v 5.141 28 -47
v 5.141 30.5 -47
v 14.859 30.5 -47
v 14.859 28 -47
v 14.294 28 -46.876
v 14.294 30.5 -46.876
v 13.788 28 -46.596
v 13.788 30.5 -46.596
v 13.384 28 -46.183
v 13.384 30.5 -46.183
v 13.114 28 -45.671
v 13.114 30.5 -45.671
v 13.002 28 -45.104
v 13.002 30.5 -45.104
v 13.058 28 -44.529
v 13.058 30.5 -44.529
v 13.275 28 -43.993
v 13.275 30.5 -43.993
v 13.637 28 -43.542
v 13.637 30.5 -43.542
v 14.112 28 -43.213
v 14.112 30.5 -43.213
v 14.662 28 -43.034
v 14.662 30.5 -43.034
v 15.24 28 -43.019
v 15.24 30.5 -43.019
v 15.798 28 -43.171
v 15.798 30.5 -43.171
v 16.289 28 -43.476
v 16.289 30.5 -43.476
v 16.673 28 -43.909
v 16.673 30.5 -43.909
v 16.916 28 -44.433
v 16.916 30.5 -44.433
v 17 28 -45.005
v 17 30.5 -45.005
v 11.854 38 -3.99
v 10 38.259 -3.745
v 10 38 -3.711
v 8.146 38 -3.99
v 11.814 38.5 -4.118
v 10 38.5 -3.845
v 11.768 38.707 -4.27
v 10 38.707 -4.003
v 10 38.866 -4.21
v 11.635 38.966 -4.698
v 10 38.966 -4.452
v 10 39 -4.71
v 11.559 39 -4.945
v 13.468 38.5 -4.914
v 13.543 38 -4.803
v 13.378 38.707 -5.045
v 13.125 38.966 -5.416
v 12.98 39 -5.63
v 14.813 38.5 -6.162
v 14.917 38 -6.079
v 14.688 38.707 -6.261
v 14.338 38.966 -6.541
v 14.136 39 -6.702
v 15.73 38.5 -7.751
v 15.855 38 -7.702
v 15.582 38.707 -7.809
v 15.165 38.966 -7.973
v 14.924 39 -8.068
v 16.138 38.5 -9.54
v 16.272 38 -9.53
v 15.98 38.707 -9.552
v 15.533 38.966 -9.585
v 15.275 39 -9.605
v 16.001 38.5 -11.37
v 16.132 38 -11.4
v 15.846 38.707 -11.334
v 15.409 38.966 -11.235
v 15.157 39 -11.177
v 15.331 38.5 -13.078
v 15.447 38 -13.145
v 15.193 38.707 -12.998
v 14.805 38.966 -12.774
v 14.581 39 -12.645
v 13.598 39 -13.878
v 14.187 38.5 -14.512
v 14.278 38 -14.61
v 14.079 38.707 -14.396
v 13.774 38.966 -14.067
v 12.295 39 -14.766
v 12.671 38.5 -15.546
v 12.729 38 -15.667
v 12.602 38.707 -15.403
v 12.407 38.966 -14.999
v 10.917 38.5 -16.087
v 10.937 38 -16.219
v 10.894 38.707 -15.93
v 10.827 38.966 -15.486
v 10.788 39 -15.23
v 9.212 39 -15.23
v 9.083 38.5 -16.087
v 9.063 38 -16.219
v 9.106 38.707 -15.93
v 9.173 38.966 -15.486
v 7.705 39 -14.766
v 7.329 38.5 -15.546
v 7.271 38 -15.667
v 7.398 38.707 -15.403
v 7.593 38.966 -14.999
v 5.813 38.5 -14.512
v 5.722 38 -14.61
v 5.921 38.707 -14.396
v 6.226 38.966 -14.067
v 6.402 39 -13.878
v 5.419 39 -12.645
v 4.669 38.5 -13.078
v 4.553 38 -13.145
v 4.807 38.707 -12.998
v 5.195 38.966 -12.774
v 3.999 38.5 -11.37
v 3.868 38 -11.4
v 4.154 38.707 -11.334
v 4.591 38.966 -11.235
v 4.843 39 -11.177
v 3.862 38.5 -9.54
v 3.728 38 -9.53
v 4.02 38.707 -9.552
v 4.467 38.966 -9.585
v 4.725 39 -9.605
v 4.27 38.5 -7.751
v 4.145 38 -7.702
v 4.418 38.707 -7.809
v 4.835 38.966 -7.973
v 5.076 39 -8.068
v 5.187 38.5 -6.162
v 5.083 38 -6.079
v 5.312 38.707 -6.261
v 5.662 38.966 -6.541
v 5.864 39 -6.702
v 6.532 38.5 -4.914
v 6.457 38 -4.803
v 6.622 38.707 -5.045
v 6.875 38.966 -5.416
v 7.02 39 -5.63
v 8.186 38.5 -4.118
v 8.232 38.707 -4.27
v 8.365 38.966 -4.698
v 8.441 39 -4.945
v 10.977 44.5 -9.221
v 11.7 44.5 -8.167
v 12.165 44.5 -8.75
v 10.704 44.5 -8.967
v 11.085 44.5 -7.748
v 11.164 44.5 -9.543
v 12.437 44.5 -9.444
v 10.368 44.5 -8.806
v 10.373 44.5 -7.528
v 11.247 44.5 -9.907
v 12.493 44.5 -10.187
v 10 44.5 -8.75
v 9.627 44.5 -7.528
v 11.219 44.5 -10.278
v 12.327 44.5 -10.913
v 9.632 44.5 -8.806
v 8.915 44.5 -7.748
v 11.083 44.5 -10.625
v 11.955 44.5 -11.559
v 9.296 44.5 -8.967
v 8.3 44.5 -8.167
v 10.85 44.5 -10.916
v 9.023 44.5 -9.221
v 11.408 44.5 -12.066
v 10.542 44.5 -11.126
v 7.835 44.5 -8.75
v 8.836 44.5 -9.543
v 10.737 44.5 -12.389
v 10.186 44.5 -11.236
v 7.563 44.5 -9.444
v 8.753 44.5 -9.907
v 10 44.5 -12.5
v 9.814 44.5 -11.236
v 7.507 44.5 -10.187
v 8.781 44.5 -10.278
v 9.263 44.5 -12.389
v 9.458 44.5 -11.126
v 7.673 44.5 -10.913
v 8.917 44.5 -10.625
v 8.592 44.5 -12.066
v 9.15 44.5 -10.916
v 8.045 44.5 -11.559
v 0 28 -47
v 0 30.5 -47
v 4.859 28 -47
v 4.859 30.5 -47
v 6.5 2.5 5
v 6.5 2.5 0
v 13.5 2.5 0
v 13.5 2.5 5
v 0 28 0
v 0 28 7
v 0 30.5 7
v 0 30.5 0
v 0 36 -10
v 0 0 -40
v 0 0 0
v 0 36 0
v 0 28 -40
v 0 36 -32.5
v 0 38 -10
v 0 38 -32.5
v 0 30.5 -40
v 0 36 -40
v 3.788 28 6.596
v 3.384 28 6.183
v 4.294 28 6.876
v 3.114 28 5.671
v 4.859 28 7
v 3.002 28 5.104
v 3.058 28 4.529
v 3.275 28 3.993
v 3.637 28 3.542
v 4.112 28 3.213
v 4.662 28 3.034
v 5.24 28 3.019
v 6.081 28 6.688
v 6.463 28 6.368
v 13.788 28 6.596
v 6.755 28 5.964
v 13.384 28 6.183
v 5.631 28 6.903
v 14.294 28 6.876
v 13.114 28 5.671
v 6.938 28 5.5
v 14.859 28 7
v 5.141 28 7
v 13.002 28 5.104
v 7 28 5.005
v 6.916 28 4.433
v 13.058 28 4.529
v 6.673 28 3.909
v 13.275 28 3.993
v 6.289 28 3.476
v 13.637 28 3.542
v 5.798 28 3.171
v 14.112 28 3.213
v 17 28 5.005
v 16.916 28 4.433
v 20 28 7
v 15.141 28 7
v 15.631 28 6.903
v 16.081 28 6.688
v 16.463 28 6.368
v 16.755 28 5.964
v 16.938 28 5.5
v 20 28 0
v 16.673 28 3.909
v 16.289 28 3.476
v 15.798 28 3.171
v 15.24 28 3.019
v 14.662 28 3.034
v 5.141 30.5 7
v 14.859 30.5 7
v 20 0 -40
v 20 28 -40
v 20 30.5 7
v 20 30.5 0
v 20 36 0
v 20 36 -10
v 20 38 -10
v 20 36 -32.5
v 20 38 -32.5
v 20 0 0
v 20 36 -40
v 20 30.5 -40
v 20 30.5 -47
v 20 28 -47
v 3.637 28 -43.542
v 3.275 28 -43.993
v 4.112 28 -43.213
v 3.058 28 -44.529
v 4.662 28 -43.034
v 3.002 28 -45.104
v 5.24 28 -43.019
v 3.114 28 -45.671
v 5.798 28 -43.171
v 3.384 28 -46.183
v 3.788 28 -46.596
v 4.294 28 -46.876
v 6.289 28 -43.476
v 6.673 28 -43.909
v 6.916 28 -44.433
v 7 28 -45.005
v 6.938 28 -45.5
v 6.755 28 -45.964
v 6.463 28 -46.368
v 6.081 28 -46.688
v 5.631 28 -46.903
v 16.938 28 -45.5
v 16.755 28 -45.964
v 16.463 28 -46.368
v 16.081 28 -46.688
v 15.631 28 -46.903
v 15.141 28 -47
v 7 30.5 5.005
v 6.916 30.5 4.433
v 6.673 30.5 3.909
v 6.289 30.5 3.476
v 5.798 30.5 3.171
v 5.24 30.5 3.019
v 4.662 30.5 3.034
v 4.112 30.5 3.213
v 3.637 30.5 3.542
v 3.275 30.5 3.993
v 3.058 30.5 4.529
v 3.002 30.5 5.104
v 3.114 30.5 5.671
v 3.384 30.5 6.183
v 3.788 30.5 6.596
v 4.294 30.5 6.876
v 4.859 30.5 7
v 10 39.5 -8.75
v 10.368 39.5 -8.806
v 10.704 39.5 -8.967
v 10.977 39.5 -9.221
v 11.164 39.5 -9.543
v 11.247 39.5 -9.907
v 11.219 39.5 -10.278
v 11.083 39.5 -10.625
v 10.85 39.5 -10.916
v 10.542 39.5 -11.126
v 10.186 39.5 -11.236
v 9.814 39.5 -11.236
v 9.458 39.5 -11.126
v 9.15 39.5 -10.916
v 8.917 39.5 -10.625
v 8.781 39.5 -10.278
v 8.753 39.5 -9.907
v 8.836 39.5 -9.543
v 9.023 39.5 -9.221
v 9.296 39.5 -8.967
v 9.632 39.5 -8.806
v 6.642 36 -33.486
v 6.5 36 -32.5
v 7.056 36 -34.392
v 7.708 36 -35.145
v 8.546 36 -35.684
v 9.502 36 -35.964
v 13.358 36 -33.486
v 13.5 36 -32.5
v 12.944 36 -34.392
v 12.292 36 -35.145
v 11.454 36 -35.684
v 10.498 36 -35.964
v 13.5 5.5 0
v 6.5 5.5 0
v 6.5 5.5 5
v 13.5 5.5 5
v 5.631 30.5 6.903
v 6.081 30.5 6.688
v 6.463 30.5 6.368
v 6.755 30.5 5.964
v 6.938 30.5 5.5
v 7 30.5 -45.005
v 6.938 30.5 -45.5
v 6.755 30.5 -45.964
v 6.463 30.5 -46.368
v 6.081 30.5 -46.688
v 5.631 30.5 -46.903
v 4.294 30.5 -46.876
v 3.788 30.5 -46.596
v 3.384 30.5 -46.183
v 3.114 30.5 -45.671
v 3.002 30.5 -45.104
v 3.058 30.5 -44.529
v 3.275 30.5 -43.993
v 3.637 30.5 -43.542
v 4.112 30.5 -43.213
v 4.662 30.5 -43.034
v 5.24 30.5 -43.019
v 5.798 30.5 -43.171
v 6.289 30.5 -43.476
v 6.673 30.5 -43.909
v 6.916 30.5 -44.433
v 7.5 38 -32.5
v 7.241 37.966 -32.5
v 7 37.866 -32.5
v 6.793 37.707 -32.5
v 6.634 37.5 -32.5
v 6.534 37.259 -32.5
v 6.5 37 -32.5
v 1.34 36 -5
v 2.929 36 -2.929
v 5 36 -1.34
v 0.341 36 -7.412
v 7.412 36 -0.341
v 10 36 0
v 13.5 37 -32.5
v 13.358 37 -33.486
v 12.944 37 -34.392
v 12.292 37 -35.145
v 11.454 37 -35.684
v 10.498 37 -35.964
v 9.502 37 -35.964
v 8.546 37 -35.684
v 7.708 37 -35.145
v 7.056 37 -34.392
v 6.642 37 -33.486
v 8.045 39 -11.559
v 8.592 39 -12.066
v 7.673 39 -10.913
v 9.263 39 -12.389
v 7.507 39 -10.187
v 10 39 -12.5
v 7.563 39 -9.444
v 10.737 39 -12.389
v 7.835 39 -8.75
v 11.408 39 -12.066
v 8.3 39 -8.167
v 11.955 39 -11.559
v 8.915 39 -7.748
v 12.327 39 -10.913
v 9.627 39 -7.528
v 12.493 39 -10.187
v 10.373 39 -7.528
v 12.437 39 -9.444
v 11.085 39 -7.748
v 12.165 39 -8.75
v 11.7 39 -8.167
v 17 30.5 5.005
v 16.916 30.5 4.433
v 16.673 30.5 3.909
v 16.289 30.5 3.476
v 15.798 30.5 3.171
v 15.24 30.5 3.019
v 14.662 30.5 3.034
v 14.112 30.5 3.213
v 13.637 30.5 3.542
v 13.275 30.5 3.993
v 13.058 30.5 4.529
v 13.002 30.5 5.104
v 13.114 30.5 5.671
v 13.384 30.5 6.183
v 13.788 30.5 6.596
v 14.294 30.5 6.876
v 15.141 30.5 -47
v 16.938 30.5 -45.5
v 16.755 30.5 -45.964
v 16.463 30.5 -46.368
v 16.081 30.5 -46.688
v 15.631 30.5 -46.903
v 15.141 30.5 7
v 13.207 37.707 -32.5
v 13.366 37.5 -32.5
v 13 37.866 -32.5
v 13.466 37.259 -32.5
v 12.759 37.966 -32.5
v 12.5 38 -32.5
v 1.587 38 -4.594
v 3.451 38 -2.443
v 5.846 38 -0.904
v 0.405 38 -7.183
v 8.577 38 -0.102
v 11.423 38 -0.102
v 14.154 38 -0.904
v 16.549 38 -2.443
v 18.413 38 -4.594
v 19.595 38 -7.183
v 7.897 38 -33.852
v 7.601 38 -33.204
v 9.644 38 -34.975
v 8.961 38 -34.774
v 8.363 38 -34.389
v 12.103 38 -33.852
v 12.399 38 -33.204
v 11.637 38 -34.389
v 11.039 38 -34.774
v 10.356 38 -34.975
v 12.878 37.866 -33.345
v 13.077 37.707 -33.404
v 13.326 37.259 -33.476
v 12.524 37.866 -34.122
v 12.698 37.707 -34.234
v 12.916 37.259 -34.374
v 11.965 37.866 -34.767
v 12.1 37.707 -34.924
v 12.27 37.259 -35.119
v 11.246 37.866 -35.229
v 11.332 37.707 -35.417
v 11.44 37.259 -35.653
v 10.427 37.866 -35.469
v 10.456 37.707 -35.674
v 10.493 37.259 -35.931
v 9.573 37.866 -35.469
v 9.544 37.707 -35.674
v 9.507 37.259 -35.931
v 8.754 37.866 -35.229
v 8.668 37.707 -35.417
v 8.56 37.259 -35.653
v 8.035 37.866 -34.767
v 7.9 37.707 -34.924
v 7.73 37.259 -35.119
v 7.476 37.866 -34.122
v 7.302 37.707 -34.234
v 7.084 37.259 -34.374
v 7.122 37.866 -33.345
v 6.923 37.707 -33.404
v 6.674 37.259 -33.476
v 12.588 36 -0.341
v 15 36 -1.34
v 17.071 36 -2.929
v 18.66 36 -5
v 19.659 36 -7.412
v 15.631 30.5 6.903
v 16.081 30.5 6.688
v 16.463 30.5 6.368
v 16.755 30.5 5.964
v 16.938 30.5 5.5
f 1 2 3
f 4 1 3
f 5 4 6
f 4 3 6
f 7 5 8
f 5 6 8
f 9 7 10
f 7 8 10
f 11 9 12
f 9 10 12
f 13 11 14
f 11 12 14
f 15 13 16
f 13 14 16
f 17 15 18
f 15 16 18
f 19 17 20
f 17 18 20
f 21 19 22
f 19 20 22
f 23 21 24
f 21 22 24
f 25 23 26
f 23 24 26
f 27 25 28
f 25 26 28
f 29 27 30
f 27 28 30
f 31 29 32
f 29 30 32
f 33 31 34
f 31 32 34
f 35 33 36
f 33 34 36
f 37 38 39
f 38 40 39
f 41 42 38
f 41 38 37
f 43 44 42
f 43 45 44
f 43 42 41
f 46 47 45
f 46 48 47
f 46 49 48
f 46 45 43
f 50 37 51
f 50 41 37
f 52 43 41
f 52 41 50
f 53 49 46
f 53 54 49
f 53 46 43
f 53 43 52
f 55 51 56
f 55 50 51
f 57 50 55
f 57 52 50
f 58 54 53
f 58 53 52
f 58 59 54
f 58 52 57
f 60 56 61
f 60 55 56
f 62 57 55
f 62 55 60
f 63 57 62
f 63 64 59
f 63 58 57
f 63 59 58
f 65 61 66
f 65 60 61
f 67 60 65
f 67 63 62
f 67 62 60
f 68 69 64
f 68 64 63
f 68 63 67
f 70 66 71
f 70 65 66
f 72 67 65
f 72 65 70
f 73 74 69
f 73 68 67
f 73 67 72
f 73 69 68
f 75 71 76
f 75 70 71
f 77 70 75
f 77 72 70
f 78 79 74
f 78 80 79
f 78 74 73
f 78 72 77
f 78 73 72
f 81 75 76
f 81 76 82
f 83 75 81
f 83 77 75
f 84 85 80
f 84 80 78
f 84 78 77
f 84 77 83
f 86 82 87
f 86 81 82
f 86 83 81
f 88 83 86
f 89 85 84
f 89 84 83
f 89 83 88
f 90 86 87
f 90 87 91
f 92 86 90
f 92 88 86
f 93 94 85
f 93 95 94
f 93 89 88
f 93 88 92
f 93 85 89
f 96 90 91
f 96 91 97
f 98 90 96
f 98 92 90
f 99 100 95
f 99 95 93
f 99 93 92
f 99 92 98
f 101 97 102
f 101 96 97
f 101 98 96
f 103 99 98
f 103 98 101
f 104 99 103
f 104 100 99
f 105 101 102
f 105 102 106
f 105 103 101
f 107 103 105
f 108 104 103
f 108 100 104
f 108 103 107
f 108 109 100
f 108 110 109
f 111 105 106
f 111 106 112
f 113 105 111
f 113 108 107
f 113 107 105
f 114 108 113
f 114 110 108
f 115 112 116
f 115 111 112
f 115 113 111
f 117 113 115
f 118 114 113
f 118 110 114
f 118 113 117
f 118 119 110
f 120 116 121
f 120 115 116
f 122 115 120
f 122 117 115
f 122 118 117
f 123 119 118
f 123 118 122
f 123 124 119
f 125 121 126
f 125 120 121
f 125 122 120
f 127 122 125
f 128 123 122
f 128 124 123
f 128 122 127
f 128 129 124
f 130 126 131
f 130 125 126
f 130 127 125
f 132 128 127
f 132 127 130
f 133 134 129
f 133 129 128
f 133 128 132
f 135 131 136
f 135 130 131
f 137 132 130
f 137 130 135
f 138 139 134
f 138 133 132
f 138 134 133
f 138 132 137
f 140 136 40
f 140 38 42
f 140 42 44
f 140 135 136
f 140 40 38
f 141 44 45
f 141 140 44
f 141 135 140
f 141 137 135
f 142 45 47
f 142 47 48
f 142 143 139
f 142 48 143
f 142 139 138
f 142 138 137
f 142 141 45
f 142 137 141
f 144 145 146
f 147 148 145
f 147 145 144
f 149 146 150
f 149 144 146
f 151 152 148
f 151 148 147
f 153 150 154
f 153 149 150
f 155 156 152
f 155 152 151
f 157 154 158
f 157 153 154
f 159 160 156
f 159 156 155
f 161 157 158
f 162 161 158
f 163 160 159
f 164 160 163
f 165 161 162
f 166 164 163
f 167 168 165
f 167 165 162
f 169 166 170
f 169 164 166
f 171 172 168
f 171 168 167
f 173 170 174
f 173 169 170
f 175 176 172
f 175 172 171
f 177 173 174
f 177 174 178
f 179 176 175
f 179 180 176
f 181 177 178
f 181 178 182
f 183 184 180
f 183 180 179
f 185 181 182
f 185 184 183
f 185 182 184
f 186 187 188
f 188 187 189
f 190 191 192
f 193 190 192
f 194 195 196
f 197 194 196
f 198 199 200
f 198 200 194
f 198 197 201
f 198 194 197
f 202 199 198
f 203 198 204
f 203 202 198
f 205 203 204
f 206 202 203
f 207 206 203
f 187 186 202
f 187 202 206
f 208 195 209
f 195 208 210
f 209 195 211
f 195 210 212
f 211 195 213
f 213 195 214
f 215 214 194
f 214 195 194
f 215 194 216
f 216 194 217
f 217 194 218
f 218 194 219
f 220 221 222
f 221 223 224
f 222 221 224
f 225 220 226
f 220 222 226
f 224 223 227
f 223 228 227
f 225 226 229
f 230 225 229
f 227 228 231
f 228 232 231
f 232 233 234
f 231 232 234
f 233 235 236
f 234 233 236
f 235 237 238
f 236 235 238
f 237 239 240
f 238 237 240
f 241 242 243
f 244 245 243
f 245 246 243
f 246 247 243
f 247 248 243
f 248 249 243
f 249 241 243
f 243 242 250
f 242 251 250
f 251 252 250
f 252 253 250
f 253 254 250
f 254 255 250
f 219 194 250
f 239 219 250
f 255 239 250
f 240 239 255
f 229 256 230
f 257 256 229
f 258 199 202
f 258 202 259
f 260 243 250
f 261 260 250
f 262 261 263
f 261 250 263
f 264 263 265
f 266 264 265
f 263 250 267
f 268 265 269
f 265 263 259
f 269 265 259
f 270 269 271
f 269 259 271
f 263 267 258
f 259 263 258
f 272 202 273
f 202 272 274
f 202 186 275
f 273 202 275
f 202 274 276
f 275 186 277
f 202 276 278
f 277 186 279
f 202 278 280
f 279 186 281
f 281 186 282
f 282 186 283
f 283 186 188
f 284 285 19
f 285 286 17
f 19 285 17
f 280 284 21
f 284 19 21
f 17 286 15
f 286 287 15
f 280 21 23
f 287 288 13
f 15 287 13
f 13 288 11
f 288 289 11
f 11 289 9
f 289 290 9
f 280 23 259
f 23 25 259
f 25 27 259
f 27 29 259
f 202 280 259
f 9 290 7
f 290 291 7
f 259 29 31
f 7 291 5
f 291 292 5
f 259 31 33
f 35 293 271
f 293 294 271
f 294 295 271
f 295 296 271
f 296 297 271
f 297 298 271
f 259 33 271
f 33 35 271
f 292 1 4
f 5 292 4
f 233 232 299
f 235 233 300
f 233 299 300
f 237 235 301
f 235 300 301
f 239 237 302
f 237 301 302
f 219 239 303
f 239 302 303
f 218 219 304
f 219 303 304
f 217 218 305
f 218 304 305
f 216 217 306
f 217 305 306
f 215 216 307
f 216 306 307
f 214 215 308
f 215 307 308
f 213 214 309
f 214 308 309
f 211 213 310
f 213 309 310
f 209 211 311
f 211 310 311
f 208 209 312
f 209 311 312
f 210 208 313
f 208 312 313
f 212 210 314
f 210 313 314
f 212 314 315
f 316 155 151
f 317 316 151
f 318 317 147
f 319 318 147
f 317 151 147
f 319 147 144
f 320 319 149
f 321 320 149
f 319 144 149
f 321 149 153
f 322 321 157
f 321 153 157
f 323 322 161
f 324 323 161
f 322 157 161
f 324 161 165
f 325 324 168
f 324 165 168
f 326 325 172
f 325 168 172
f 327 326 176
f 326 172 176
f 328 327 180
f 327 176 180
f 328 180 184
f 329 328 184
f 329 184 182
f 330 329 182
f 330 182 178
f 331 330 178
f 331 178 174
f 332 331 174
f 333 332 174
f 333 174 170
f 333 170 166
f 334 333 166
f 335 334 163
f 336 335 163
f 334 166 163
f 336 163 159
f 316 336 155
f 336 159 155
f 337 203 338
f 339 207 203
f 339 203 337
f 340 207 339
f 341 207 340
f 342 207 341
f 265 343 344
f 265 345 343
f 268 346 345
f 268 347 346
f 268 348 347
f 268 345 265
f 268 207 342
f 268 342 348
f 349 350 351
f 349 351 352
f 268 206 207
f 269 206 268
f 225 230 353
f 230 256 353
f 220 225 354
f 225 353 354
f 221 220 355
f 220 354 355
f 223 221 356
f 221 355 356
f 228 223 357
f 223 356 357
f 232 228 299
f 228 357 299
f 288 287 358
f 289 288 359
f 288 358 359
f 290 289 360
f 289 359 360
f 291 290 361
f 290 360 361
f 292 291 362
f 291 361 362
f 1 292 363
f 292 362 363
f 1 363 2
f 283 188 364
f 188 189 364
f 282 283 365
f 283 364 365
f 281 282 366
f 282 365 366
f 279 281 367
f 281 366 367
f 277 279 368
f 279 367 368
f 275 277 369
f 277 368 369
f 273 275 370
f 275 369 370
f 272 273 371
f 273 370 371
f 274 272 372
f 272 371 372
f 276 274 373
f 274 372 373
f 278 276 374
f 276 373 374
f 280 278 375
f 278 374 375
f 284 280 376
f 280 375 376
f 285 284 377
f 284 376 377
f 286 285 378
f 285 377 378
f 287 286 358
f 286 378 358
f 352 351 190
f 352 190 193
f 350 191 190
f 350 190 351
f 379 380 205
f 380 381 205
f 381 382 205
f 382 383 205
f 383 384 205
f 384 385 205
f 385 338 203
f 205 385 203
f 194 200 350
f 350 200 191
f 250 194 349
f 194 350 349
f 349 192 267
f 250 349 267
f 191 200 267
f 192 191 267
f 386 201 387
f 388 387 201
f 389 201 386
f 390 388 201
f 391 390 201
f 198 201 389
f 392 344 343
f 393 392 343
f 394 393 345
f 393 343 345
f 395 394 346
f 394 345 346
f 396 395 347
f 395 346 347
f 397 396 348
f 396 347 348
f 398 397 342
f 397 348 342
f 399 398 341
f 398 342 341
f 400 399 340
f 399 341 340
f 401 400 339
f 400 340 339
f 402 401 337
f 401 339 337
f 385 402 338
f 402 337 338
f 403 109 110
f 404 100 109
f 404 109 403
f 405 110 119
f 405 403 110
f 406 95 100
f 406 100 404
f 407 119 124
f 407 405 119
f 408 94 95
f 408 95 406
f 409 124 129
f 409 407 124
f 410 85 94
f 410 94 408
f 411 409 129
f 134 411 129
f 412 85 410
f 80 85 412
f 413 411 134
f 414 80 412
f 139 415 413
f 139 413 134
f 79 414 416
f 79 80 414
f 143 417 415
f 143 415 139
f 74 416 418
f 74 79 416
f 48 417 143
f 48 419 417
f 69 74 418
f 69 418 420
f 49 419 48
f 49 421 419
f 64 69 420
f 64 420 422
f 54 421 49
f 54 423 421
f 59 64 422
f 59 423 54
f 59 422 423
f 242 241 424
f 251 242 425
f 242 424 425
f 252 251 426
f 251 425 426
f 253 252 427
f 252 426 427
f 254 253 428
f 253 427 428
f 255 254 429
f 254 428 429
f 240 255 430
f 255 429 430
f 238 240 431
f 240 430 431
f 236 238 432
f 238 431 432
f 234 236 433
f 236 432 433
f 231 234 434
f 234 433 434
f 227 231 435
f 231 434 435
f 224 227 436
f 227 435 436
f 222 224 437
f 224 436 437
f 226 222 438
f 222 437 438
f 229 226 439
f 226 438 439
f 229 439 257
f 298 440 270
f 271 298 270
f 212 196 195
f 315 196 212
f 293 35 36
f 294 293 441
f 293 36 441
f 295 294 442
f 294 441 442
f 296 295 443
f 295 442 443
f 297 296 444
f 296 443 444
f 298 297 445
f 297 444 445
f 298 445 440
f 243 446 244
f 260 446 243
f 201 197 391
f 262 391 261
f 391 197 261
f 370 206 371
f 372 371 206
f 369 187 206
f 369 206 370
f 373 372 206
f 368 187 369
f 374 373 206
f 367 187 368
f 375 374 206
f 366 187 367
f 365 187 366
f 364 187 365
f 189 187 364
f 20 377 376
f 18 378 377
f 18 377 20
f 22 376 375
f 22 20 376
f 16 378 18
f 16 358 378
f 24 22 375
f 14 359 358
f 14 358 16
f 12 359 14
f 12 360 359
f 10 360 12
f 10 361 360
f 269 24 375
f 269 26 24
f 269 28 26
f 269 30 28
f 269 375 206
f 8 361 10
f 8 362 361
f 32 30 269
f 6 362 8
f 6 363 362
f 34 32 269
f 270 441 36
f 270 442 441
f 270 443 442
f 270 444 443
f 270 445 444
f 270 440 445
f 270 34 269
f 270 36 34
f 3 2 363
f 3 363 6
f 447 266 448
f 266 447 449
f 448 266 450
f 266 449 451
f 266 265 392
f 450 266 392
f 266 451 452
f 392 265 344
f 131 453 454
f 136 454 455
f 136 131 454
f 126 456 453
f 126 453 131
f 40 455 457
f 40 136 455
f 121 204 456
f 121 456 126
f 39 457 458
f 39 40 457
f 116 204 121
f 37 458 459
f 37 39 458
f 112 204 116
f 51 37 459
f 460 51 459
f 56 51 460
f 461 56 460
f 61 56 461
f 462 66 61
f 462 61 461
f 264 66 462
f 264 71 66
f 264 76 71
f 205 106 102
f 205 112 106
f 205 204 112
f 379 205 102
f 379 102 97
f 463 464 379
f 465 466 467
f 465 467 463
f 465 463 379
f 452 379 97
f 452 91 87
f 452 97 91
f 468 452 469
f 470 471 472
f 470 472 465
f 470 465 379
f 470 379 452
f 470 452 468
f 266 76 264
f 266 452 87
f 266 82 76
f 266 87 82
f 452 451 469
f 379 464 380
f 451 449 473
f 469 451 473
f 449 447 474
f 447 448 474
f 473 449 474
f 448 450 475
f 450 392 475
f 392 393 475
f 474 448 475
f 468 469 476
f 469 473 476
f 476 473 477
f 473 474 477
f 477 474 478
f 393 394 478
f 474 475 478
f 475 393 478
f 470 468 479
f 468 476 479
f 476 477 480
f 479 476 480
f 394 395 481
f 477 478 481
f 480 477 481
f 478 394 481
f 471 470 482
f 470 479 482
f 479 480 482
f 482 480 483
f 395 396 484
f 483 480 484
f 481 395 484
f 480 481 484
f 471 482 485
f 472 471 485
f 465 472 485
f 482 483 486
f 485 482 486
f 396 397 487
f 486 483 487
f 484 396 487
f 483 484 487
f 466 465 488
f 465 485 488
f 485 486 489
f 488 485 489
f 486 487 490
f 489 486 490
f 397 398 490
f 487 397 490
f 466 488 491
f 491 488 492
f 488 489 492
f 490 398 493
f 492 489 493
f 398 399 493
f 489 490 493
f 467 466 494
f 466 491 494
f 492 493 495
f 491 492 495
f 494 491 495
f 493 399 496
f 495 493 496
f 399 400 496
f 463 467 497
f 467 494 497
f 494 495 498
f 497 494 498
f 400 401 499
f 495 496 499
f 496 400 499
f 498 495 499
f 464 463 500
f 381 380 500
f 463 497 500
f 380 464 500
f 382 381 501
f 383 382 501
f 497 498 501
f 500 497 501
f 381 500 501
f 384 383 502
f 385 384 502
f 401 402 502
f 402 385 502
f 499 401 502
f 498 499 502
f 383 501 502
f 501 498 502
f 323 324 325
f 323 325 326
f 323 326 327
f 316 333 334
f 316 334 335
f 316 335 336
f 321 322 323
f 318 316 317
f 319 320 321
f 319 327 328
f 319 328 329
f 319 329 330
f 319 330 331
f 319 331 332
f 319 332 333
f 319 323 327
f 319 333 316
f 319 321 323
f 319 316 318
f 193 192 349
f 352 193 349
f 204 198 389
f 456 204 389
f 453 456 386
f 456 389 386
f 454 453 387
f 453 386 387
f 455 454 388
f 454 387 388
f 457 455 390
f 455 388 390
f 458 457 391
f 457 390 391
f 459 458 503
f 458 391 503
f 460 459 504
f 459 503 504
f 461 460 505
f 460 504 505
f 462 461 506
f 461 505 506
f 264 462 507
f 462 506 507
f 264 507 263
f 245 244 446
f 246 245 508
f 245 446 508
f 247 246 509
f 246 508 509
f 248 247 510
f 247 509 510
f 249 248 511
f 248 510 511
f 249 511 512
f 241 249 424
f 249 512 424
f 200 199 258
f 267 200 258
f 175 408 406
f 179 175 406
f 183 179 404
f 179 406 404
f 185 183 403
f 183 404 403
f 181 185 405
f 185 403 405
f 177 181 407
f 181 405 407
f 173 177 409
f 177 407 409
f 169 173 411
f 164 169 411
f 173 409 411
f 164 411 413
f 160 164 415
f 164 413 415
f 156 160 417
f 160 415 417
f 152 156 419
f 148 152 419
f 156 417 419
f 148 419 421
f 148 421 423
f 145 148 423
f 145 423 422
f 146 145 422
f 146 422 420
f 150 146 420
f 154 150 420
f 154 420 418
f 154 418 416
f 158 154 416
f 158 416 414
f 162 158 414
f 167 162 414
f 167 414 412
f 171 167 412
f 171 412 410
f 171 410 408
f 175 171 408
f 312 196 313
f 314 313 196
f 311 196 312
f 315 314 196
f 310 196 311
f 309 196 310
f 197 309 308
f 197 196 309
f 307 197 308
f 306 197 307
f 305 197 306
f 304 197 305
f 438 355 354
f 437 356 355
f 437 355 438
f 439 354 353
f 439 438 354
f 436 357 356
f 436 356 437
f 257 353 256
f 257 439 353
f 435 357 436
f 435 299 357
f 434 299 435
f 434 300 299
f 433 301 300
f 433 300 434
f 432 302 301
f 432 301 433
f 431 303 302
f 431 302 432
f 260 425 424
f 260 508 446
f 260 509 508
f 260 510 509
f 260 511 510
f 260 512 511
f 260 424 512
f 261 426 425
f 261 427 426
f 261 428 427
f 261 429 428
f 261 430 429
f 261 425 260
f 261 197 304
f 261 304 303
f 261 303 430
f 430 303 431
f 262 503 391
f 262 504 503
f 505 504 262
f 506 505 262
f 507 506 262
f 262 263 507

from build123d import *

# Parameters (mm, degrees)
SKETCH1_W                = 20
SKETCH1_H                = 40
BOSS_EXTRUDE1_DEPTH      = 36
SKETCH2_W                = 7
SKETCH2_H                = 3
BOSS_EXTRUDE2_DEPTH      = 5
SKETCH3_R                = 2.5
BOSS_EXTRUDE3_DEPTH      = 8.5
BOSS_EXTRUDE4_DEPTH      = 7
BOSS_EXTRUDE4_DEPTH_BACK = 47
SKETCH4_W                = 20
SKETCH4_H                = 2.5
SKETCH5_R                = 2
CUT_EXTRUDE1_DEPTH       = 7
BOSS_EXTRUDE5_DEPTH      = 2
SKETCH7_R                = 6.289454611
BOSS_EXTRUDE6_DEPTH      = 1
FILLET1_R                = 1
FILLET2_R                = 1
SKETCH8_R                = 1.25
CUT_EXTRUDE2_DEPTH       = 5


with BuildPart() as part:
    # Sketch1 → Boss-Extrude1 (new body)
    with BuildSketch(Plane(origin=(0, 0, 0), x_dir=(1, 0, 0), z_dir=(0, 1, 0))):
        with Locations((10, 20)):
            Rectangle(SKETCH1_W, SKETCH1_H)
    extrude(amount=BOSS_EXTRUDE1_DEPTH)

    # Sketch2 → Boss-Extrude2 (add)
    with BuildSketch(Plane.XY):
        with Locations((10, 4)):
            Rectangle(SKETCH2_W, SKETCH2_H)
    extrude(amount=BOSS_EXTRUDE2_DEPTH)

    # Sketch3 → Boss-Extrude3 (add)
    with BuildSketch(Plane(origin=(0, 36, 0), x_dir=(1, 0, 0), z_dir=(0, 1, 0))):
        with Locations(Location((10, 10, 0), (0, 0, 90))):
            Circle(SKETCH3_R)
    extrude(amount=BOSS_EXTRUDE3_DEPTH)

    # Sketch4 → Boss-Extrude4 (add, two sides: drawn at the far end of the back side and taken through both)
    with BuildSketch(Plane.XY.offset(-BOSS_EXTRUDE4_DEPTH_BACK)):
        with Locations((10, 29.25)):
            Rectangle(SKETCH4_W, SKETCH4_H)
    extrude(amount=BOSS_EXTRUDE4_DEPTH + BOSS_EXTRUDE4_DEPTH_BACK)

    # Sketch5 → Cut-Extrude1 (cut)
    with BuildSketch(Plane(origin=(0, 30.5, 0), x_dir=(1, 0, 0), z_dir=(0, 1, 0))):
        with Locations((15, 45.005)):
            Circle(SKETCH5_R)
        with Locations((5, 45.005)):
            Circle(SKETCH5_R)
        with Locations((15, -5.005)):
            Circle(SKETCH5_R)
        with Locations((5, -5.005)):
            Circle(SKETCH5_R)
    extrude(amount=-CUT_EXTRUDE1_DEPTH, mode=Mode.SUBTRACT)

    # Sketch6 → Boss-Extrude5 (add)
    with BuildSketch(Plane(origin=(0, 36, 0), x_dir=(1, 0, 0), z_dir=(0, 1, 0))):
        with BuildLine():
            Line((20, 32.5), (13.5, 32.5))
            ThreePointArc((13.5, 32.5), (10, 36), (6.5, 32.5))
            Line((6.5, 32.5), (0, 32.5))
            Line((0, 32.5), (0, 10))
            ThreePointArc((0, 10), (10, 0), (20, 10))
            Line((20, 10), (20, 32.5))
        make_face()
    extrude(amount=BOSS_EXTRUDE5_DEPTH)

    # Sketch7 → Boss-Extrude6 (add)
    with BuildSketch(Plane(origin=(0, 38, 0), x_dir=(1, 0, 0), z_dir=(0, 1, 0))):
        with Locations(Location((10, 10, 0), (0, 0, 270))):
            Circle(SKETCH7_R)
    extrude(amount=BOSS_EXTRUDE6_DEPTH)

    # Fillet1
    fillet1_edges = [part.edges().sort_by_distance(p)[0] for p in [
        (10, 39, -16.289454611),
    ]]
    fillet(fillet1_edges, radius=FILLET1_R - 0.0001)  # a hair under: the kernel refuses the full size

    # Fillet2
    fillet2_edges = [part.edges().sort_by_distance(p)[0] for p in [
        (10, 38, -36),
    ]]
    fillet(fillet2_edges, radius=FILLET2_R)

    # Sketch8 → Cut-Extrude2 (cut)
    with BuildSketch(Plane(origin=(0, 44.5, 0), x_dir=(1, 0, 0), z_dir=(0, 1, 0))):
        with Locations(Location((10, 10, 0), (0, 0, 270))):
            Circle(SKETCH8_R)
    extrude(amount=-CUT_EXTRUDE2_DEPTH, mode=Mode.SUBTRACT)


solid = part.part
